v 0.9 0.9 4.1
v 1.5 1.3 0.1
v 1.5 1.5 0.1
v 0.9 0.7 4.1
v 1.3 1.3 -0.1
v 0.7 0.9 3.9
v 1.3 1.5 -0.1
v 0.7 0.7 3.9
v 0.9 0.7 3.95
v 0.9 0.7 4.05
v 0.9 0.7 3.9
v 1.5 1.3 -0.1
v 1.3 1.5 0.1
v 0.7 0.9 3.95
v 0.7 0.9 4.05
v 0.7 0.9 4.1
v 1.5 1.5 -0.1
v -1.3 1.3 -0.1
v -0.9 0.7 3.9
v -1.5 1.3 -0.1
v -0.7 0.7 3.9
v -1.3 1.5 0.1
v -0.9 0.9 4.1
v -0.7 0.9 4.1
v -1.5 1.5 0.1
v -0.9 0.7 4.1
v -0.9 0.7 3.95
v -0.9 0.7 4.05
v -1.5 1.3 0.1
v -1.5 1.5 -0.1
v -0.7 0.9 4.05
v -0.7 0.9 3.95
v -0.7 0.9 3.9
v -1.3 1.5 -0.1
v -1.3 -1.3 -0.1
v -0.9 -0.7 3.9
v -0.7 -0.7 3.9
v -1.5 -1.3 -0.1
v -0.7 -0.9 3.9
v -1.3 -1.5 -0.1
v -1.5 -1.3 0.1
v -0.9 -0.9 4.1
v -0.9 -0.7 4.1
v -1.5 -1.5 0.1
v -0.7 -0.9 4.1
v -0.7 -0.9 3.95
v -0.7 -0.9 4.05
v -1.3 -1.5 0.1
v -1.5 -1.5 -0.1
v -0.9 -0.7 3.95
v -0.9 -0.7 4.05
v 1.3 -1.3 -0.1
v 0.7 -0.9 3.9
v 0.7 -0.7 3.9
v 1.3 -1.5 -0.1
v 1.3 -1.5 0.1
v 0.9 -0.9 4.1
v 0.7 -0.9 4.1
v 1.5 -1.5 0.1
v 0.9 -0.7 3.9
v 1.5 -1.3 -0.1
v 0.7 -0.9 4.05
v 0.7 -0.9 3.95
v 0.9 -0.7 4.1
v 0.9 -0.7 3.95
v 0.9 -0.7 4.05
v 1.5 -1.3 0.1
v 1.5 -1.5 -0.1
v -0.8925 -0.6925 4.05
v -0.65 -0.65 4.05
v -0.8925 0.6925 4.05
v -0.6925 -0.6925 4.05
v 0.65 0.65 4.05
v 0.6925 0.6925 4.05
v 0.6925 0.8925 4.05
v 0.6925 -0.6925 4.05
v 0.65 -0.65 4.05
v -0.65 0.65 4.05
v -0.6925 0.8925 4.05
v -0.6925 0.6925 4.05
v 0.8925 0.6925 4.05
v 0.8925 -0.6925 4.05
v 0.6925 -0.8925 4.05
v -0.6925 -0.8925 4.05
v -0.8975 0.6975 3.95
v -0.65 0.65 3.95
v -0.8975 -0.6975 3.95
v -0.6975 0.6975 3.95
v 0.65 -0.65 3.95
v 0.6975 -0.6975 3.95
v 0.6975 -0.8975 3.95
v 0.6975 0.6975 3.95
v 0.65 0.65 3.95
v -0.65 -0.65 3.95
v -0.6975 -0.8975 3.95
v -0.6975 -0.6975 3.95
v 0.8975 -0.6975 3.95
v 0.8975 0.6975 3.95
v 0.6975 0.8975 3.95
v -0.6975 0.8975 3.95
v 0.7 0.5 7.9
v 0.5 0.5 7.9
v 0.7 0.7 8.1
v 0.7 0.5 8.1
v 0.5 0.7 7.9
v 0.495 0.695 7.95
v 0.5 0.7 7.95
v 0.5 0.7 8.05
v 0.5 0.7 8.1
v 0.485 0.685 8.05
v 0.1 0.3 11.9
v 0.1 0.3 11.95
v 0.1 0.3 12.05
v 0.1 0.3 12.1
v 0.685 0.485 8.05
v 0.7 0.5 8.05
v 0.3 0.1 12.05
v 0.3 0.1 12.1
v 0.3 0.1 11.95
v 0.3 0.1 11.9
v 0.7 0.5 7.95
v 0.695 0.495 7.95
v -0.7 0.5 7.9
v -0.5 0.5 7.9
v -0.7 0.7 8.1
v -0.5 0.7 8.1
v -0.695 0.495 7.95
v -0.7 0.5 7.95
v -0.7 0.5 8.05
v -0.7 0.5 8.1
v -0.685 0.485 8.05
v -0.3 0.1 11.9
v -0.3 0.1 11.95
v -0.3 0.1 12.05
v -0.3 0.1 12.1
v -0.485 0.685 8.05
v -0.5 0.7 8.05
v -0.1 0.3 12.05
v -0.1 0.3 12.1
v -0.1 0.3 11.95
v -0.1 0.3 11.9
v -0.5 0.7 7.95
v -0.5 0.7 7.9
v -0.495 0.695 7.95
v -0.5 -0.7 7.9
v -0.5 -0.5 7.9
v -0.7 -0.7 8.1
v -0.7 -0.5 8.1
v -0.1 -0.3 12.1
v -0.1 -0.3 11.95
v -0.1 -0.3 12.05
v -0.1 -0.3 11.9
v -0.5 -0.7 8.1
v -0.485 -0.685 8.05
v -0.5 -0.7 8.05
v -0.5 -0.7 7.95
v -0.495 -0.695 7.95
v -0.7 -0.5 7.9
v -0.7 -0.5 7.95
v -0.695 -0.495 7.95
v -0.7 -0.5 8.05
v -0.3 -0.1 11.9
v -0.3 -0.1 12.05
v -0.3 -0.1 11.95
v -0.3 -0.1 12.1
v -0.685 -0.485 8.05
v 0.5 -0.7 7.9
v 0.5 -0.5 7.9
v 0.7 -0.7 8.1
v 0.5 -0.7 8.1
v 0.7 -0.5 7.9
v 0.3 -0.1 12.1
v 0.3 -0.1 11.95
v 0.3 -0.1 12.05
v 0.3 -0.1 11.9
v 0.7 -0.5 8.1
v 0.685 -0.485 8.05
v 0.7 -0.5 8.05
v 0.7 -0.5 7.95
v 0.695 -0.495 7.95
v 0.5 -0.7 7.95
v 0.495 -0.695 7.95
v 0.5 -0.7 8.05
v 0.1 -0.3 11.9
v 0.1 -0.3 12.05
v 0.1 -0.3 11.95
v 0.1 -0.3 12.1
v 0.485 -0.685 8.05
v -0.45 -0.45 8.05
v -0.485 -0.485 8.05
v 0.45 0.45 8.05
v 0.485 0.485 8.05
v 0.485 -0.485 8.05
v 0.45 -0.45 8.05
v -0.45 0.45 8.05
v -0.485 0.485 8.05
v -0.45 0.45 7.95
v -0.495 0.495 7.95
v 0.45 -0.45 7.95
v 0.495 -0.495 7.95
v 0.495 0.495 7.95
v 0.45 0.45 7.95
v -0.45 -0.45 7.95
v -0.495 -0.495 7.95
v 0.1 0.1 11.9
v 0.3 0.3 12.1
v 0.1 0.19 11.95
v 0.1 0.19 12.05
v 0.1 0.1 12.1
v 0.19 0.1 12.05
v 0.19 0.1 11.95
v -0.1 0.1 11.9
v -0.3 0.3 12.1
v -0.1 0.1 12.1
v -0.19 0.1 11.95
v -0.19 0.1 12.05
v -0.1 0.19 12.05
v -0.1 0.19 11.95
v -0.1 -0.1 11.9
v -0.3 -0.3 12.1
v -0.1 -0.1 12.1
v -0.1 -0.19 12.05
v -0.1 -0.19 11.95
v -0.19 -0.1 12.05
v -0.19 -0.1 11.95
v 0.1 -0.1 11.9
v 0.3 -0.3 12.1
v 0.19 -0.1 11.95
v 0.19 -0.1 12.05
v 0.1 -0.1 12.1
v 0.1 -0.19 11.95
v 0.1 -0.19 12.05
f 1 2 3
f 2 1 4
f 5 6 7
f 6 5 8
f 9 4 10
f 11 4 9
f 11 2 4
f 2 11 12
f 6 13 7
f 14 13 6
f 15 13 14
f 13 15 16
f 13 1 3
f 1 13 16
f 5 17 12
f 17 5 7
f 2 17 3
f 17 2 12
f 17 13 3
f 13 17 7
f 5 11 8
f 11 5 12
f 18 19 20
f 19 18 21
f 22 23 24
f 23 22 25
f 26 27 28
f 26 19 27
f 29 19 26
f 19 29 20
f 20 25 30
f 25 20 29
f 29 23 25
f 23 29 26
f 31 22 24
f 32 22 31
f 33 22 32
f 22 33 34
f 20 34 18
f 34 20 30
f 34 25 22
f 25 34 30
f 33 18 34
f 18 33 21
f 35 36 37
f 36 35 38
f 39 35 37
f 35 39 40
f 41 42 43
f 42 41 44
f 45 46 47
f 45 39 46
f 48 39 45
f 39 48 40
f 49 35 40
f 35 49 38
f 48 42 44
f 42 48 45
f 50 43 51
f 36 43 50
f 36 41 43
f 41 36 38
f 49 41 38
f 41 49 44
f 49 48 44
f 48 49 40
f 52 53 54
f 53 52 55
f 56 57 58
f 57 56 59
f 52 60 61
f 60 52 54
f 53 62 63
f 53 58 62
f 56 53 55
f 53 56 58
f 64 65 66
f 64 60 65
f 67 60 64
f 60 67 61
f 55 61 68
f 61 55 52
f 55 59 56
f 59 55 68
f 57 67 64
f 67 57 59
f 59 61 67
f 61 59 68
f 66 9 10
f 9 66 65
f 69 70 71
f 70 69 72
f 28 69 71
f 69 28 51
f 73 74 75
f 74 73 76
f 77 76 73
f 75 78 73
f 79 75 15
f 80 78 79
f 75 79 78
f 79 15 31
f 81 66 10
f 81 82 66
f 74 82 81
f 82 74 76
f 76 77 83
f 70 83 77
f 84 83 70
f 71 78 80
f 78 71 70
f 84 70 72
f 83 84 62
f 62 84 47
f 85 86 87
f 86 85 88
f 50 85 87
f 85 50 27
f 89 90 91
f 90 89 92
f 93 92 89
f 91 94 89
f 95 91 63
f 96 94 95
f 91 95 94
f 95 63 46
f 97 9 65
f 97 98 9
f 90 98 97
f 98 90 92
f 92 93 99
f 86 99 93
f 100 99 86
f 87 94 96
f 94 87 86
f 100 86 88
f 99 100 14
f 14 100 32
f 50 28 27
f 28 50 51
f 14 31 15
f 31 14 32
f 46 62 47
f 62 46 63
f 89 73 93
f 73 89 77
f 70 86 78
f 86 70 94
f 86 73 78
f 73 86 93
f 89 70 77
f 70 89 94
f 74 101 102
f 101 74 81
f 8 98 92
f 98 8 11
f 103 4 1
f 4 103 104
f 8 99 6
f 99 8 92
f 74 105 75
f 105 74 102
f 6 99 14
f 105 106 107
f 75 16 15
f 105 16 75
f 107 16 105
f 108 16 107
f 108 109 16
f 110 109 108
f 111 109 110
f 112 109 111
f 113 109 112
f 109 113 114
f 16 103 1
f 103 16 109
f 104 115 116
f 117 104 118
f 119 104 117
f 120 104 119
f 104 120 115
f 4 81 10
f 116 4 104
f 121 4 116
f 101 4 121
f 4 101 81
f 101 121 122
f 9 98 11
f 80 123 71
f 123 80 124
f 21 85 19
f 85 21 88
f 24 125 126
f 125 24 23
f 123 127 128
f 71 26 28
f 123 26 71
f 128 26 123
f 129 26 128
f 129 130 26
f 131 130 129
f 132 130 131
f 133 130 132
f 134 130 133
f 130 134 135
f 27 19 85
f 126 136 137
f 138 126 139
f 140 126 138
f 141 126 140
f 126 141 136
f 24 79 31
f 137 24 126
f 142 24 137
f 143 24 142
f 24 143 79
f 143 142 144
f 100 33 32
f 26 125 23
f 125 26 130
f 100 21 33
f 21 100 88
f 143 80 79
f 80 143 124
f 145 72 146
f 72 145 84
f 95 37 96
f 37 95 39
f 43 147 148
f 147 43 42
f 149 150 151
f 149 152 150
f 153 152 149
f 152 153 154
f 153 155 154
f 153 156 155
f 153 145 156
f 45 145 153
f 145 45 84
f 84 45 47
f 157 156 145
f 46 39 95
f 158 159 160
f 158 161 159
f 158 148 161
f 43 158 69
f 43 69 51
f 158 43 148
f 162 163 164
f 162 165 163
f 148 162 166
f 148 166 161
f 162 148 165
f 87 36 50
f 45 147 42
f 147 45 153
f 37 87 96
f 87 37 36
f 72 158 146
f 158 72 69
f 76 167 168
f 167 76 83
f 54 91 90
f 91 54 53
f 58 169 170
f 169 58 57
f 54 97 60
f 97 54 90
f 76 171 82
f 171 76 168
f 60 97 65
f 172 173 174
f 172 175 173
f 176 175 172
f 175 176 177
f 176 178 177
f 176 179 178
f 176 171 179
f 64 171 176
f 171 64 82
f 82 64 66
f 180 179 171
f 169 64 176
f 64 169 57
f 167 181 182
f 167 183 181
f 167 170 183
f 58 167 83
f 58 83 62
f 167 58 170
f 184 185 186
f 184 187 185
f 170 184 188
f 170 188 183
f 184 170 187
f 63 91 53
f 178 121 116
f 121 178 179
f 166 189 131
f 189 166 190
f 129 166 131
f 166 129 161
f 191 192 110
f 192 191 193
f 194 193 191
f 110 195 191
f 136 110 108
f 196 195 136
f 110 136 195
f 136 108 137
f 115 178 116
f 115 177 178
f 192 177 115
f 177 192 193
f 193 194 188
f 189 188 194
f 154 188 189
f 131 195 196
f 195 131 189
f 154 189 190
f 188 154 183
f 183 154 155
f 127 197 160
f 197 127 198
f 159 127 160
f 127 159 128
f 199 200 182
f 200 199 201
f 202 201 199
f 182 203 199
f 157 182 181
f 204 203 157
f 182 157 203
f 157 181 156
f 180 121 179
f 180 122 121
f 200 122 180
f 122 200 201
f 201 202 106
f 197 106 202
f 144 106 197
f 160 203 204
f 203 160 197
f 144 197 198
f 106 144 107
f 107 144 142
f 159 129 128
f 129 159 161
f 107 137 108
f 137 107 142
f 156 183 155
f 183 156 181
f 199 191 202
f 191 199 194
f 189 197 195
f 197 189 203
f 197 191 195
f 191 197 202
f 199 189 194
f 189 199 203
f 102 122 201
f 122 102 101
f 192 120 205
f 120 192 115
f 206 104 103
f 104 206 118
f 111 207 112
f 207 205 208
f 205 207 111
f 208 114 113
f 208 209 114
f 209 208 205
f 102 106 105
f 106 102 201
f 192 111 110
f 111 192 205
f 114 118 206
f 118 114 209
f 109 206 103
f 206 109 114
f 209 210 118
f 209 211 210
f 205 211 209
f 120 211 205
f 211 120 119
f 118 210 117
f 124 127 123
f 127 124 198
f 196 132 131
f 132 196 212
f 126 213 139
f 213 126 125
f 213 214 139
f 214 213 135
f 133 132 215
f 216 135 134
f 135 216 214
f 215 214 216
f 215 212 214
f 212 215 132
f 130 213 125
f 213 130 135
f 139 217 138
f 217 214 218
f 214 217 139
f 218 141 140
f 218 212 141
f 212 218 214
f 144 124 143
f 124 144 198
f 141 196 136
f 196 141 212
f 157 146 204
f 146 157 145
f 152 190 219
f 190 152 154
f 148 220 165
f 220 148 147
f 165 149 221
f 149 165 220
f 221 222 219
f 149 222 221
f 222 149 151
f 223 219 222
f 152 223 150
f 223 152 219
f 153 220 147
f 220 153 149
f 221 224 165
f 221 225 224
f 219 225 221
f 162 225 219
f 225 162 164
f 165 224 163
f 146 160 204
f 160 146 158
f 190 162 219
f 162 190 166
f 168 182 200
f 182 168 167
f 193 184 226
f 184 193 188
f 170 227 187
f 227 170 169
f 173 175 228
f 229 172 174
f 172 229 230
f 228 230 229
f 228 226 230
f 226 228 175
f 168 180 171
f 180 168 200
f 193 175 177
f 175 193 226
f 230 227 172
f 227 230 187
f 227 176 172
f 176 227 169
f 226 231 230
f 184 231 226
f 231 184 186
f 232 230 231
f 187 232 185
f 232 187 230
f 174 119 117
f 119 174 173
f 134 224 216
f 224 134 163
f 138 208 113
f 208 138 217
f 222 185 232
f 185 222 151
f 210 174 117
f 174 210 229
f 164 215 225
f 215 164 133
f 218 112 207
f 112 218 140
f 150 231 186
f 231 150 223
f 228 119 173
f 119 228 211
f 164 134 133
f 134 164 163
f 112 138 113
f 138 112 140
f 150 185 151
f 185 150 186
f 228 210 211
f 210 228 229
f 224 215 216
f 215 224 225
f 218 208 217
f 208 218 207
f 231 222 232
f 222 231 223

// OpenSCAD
use <lib.scad>

module poleSmallHD() {
	translate([0,0,3]) cyl(0.1, 0.1, 6.0, $fn=8);
}

module poleLargeHD() {
	for (i = [0:90:270]) rotate([0,0,i]) hull() {
		translate([1.4,1.4,0]) box([0.2,0.2,0.2]);
		translate([0.8,0.8,4]) box([0.2,0.2,0.2]);
	}

	translate([0,0,4]) difference() {
		box([1.8,1.8,0.1]);
		box([1.3,1.3,0.2]);
	}

	for (i = [0:90:270]) rotate([0,0,i]) hull() {
		translate([0.8,0.8,4]) box([0.2,0.2,0.2]);
		translate([0.6,0.6,8]) box([0.2,0.2,0.2]);
	}

	translate([0,0,8]) difference() {
		box([1.4,1.4,0.1]);
		box([0.9,0.9,0.2]);
	}

	for (i = [0:90:270]) rotate([0,0,i]) hull() {
		translate([0.6,0.6,8]) box([0.2,0.2,0.2]);
		translate([0.2,0.2,12]) box([0.2,0.2,0.2]);
	}

	translate([0,0,12]) difference() {
		box([0.6,0.6,0.1]);
		box([0.38,0.38,0.2]);
	}
}

poleLargeHD();
